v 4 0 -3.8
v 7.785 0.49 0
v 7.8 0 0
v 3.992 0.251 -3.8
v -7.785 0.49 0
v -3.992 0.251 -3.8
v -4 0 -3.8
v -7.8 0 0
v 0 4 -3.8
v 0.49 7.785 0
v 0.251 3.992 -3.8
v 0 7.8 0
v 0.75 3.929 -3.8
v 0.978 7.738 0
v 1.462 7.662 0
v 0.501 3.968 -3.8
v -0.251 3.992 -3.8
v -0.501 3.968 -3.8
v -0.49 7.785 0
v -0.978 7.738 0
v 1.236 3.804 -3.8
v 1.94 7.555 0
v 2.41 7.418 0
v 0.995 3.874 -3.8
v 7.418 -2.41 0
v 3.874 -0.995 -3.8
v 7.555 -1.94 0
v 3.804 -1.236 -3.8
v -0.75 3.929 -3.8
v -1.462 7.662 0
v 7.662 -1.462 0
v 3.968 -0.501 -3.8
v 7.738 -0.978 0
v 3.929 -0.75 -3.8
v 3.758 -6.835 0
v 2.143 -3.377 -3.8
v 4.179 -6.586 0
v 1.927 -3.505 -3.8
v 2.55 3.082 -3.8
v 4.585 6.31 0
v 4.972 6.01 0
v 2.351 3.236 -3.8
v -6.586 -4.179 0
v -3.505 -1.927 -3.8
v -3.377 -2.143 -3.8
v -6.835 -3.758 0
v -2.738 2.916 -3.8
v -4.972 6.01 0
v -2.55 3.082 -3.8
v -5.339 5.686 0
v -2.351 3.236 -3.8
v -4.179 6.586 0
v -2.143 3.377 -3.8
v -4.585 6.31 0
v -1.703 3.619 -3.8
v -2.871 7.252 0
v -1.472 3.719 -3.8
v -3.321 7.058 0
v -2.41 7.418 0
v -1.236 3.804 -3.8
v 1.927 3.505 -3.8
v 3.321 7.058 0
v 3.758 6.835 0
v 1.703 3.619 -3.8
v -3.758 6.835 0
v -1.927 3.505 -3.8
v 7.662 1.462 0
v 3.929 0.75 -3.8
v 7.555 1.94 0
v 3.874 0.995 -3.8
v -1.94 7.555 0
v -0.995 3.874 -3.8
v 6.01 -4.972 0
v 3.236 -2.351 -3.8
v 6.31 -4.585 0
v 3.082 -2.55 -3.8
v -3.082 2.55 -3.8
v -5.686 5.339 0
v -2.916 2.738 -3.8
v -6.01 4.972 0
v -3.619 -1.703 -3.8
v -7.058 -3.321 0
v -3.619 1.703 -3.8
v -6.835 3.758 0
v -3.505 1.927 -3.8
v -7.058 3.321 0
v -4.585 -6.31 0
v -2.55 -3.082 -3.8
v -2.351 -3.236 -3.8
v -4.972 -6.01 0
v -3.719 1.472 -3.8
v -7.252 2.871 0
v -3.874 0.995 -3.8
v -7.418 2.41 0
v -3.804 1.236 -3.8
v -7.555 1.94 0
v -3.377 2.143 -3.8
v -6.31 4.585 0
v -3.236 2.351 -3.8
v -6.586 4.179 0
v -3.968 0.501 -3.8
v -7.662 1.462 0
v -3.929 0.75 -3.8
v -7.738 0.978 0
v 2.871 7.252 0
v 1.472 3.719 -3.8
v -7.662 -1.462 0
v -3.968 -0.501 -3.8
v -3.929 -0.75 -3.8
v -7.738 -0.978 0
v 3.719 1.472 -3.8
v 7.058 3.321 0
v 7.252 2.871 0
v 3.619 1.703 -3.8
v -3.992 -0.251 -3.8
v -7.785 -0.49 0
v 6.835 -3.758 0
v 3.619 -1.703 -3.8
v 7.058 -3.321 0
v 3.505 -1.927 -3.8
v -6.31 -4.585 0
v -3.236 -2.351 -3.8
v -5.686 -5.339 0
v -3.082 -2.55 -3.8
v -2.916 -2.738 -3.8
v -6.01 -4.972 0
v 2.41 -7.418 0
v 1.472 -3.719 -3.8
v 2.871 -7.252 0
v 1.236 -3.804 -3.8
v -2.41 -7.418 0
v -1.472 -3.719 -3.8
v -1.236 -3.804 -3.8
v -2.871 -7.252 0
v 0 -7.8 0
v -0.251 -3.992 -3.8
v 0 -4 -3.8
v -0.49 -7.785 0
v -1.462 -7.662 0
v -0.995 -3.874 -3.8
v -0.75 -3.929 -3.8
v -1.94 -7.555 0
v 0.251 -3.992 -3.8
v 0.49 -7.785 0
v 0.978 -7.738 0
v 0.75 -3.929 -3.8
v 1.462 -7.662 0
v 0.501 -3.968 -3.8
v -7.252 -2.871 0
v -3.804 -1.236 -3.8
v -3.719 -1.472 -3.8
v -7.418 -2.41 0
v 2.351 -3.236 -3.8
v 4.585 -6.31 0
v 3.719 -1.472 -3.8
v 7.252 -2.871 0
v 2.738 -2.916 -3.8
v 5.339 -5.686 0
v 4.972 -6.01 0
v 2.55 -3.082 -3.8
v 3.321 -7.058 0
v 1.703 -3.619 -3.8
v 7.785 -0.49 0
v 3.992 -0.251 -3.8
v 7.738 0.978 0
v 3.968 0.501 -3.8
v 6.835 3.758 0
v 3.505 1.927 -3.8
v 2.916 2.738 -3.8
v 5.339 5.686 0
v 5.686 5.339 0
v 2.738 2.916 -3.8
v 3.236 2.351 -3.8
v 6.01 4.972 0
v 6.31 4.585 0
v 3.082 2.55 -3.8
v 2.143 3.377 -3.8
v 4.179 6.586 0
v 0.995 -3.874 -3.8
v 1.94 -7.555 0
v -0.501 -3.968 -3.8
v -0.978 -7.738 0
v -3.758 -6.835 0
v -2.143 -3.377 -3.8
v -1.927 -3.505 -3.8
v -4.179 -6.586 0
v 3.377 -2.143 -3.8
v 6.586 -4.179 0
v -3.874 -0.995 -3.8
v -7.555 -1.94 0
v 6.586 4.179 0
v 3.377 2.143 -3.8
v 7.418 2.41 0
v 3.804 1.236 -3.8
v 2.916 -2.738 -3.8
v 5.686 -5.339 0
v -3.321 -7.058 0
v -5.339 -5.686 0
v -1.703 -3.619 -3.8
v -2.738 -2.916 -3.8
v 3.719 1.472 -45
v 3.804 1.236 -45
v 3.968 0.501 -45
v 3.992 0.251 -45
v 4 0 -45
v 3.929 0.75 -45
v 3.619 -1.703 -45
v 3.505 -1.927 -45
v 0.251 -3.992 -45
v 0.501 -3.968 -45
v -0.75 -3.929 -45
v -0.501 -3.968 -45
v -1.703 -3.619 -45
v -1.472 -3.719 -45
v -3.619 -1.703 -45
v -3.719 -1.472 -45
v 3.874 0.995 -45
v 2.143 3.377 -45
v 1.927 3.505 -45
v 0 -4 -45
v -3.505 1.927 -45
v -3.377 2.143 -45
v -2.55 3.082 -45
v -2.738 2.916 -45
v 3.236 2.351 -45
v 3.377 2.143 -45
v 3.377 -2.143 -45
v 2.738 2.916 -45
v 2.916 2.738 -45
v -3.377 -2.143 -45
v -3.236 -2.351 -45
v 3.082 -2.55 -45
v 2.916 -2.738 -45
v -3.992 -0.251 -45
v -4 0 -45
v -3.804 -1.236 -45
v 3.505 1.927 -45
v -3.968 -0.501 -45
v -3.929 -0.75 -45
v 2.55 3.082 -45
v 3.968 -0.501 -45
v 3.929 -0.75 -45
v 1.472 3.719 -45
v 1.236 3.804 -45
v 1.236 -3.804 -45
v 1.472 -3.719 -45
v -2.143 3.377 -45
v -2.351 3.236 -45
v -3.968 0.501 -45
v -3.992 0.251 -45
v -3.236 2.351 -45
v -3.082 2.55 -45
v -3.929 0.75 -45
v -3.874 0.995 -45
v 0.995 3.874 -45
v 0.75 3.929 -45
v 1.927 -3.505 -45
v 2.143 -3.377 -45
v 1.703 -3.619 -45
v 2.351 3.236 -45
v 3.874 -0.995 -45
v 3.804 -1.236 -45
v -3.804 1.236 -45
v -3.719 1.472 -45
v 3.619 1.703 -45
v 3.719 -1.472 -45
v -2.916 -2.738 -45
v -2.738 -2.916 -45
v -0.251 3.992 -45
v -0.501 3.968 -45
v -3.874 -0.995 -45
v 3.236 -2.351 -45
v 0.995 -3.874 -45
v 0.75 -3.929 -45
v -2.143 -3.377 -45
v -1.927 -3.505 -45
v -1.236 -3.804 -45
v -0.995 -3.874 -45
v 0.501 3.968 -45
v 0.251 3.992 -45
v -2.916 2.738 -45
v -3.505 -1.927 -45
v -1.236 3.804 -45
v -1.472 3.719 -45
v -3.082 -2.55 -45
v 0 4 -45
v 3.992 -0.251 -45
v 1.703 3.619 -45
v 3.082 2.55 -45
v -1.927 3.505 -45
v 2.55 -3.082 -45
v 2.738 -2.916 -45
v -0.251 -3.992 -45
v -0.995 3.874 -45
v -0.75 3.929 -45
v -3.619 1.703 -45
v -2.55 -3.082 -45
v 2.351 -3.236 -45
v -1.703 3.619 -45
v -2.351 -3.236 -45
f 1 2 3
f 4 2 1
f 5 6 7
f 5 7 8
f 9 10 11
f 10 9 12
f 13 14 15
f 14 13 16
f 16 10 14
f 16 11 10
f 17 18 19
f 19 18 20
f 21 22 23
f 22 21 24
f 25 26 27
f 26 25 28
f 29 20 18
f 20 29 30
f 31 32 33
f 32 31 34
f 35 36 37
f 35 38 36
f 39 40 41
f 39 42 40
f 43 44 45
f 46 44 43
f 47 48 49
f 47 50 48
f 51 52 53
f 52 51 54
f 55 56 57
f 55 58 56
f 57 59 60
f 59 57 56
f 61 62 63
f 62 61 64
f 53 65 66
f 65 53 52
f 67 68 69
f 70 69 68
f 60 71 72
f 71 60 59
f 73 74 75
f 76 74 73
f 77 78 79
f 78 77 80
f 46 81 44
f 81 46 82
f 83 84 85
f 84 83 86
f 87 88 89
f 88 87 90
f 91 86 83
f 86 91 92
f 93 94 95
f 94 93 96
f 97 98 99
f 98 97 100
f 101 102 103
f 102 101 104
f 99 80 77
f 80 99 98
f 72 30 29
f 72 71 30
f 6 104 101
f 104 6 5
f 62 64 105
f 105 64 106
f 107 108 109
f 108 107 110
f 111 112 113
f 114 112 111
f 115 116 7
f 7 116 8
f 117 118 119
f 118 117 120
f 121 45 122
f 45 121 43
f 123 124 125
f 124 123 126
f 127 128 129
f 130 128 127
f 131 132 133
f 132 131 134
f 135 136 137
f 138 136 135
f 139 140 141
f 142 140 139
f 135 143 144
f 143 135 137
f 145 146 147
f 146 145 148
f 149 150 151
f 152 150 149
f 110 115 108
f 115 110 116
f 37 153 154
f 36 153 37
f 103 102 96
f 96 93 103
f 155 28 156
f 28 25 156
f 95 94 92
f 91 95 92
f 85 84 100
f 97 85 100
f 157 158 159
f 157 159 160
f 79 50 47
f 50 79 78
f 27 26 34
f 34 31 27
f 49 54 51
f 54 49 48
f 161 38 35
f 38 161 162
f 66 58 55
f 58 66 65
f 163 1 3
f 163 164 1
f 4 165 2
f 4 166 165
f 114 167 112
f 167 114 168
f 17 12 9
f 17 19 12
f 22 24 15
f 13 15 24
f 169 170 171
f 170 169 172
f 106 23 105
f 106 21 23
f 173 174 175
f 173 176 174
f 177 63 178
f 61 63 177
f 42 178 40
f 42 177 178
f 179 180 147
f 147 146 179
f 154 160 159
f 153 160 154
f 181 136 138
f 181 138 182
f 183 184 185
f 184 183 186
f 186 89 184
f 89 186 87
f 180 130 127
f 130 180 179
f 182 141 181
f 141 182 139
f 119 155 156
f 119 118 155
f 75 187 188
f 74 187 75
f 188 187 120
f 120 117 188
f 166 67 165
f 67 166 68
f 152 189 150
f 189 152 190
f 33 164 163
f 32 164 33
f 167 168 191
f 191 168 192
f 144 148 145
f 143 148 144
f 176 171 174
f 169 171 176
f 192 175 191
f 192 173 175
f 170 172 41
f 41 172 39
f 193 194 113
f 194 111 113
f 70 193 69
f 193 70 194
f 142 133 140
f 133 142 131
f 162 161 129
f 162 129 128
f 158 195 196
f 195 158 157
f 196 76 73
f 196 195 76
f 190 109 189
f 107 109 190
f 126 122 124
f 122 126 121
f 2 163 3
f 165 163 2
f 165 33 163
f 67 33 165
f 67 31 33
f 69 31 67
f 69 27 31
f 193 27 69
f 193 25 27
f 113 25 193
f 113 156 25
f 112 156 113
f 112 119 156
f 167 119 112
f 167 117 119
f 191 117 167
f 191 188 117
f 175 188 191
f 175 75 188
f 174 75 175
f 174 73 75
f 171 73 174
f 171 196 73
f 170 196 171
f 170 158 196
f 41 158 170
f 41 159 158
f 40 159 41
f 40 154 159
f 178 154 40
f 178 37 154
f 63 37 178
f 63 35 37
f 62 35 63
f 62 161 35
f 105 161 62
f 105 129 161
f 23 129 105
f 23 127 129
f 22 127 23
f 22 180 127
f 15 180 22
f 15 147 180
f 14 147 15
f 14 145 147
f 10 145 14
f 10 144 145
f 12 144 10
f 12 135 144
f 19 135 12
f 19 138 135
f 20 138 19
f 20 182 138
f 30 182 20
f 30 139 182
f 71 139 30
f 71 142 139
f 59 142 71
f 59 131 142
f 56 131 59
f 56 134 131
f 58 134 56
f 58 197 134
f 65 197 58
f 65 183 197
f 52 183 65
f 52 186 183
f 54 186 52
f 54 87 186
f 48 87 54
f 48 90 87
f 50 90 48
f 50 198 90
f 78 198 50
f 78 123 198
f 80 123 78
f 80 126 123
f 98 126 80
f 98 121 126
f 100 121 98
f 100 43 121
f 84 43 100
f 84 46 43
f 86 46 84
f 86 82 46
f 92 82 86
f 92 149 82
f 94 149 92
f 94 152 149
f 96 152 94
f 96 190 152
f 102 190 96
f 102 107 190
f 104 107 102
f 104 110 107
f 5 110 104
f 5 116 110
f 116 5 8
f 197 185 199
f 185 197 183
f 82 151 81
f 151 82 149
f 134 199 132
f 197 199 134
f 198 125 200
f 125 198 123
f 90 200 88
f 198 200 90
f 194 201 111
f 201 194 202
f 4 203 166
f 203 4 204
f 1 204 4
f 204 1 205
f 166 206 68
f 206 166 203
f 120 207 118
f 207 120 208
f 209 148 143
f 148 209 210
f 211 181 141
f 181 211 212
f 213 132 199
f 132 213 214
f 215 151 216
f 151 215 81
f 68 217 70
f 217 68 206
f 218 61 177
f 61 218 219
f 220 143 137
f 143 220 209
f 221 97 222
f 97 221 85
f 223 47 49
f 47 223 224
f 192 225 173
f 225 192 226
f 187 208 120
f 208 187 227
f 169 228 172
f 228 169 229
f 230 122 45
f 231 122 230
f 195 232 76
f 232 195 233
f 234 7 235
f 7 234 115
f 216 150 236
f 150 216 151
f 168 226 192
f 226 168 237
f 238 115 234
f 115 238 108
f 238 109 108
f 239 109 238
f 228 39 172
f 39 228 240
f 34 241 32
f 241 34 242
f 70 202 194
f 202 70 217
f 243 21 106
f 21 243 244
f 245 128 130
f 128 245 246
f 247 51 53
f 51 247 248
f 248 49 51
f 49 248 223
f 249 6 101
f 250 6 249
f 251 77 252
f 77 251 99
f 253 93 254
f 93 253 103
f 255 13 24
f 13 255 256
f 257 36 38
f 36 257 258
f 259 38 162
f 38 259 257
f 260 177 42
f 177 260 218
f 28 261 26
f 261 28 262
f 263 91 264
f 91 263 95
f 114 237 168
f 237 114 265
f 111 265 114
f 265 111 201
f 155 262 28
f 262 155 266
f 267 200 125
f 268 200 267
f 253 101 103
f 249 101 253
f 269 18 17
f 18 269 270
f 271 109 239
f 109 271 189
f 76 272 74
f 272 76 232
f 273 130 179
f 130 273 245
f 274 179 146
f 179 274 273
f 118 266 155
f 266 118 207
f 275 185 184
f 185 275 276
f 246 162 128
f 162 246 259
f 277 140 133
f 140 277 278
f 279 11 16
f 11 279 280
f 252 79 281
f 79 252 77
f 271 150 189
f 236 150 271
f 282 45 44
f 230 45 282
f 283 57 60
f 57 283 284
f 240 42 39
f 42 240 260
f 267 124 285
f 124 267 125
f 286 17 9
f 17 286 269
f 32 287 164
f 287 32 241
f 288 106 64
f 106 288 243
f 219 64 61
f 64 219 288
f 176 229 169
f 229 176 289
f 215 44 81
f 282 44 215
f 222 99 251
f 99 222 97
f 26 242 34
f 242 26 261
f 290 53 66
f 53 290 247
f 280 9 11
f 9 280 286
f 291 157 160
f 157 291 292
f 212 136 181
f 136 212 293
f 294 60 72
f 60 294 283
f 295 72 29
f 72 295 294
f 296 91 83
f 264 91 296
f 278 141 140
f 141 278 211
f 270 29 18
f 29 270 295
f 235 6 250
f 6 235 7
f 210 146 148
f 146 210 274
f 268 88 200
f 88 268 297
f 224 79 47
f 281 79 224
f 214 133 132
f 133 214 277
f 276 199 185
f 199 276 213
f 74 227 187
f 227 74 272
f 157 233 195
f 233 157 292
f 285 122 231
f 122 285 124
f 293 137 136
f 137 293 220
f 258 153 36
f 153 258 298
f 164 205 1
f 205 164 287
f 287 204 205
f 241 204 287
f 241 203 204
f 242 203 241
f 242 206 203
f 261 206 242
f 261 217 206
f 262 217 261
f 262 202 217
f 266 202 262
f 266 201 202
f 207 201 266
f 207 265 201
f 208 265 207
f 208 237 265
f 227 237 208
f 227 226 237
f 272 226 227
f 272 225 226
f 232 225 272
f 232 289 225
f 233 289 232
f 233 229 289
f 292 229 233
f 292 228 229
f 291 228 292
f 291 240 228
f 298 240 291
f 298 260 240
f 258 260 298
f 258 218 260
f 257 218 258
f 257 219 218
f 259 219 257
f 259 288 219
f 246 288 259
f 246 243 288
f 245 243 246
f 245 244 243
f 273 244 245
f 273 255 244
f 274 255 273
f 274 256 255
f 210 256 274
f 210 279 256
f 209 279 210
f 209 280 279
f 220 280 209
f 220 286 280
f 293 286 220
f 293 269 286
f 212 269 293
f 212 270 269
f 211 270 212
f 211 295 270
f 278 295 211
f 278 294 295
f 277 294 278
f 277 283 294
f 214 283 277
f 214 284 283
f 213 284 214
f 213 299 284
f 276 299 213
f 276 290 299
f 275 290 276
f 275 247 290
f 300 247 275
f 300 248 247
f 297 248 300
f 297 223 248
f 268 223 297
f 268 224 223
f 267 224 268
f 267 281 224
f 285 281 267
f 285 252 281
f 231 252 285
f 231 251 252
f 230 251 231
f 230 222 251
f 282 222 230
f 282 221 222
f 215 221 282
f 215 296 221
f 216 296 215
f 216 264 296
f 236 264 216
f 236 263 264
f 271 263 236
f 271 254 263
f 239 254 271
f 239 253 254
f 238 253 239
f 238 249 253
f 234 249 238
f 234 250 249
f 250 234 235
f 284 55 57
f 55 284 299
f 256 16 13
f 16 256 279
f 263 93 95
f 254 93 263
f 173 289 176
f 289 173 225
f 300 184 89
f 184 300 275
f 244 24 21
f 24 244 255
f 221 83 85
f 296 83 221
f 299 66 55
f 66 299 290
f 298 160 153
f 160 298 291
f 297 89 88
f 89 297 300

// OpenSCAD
$fn=100;

// M8
crew_head_diameter=(15.8+15.4)/2; // dk
crew_body_diameter=8;

screw_length=45;

// Head
translate([0, 0, -crew_head_diameter/2])
cylinder(h=crew_head_diameter/2,r1=0, r2=crew_head_diameter/2, center=false);

// Body
translate([0, 0, -screw_length])
cylinder(h=screw_length, d=crew_body_diameter, center=false);
